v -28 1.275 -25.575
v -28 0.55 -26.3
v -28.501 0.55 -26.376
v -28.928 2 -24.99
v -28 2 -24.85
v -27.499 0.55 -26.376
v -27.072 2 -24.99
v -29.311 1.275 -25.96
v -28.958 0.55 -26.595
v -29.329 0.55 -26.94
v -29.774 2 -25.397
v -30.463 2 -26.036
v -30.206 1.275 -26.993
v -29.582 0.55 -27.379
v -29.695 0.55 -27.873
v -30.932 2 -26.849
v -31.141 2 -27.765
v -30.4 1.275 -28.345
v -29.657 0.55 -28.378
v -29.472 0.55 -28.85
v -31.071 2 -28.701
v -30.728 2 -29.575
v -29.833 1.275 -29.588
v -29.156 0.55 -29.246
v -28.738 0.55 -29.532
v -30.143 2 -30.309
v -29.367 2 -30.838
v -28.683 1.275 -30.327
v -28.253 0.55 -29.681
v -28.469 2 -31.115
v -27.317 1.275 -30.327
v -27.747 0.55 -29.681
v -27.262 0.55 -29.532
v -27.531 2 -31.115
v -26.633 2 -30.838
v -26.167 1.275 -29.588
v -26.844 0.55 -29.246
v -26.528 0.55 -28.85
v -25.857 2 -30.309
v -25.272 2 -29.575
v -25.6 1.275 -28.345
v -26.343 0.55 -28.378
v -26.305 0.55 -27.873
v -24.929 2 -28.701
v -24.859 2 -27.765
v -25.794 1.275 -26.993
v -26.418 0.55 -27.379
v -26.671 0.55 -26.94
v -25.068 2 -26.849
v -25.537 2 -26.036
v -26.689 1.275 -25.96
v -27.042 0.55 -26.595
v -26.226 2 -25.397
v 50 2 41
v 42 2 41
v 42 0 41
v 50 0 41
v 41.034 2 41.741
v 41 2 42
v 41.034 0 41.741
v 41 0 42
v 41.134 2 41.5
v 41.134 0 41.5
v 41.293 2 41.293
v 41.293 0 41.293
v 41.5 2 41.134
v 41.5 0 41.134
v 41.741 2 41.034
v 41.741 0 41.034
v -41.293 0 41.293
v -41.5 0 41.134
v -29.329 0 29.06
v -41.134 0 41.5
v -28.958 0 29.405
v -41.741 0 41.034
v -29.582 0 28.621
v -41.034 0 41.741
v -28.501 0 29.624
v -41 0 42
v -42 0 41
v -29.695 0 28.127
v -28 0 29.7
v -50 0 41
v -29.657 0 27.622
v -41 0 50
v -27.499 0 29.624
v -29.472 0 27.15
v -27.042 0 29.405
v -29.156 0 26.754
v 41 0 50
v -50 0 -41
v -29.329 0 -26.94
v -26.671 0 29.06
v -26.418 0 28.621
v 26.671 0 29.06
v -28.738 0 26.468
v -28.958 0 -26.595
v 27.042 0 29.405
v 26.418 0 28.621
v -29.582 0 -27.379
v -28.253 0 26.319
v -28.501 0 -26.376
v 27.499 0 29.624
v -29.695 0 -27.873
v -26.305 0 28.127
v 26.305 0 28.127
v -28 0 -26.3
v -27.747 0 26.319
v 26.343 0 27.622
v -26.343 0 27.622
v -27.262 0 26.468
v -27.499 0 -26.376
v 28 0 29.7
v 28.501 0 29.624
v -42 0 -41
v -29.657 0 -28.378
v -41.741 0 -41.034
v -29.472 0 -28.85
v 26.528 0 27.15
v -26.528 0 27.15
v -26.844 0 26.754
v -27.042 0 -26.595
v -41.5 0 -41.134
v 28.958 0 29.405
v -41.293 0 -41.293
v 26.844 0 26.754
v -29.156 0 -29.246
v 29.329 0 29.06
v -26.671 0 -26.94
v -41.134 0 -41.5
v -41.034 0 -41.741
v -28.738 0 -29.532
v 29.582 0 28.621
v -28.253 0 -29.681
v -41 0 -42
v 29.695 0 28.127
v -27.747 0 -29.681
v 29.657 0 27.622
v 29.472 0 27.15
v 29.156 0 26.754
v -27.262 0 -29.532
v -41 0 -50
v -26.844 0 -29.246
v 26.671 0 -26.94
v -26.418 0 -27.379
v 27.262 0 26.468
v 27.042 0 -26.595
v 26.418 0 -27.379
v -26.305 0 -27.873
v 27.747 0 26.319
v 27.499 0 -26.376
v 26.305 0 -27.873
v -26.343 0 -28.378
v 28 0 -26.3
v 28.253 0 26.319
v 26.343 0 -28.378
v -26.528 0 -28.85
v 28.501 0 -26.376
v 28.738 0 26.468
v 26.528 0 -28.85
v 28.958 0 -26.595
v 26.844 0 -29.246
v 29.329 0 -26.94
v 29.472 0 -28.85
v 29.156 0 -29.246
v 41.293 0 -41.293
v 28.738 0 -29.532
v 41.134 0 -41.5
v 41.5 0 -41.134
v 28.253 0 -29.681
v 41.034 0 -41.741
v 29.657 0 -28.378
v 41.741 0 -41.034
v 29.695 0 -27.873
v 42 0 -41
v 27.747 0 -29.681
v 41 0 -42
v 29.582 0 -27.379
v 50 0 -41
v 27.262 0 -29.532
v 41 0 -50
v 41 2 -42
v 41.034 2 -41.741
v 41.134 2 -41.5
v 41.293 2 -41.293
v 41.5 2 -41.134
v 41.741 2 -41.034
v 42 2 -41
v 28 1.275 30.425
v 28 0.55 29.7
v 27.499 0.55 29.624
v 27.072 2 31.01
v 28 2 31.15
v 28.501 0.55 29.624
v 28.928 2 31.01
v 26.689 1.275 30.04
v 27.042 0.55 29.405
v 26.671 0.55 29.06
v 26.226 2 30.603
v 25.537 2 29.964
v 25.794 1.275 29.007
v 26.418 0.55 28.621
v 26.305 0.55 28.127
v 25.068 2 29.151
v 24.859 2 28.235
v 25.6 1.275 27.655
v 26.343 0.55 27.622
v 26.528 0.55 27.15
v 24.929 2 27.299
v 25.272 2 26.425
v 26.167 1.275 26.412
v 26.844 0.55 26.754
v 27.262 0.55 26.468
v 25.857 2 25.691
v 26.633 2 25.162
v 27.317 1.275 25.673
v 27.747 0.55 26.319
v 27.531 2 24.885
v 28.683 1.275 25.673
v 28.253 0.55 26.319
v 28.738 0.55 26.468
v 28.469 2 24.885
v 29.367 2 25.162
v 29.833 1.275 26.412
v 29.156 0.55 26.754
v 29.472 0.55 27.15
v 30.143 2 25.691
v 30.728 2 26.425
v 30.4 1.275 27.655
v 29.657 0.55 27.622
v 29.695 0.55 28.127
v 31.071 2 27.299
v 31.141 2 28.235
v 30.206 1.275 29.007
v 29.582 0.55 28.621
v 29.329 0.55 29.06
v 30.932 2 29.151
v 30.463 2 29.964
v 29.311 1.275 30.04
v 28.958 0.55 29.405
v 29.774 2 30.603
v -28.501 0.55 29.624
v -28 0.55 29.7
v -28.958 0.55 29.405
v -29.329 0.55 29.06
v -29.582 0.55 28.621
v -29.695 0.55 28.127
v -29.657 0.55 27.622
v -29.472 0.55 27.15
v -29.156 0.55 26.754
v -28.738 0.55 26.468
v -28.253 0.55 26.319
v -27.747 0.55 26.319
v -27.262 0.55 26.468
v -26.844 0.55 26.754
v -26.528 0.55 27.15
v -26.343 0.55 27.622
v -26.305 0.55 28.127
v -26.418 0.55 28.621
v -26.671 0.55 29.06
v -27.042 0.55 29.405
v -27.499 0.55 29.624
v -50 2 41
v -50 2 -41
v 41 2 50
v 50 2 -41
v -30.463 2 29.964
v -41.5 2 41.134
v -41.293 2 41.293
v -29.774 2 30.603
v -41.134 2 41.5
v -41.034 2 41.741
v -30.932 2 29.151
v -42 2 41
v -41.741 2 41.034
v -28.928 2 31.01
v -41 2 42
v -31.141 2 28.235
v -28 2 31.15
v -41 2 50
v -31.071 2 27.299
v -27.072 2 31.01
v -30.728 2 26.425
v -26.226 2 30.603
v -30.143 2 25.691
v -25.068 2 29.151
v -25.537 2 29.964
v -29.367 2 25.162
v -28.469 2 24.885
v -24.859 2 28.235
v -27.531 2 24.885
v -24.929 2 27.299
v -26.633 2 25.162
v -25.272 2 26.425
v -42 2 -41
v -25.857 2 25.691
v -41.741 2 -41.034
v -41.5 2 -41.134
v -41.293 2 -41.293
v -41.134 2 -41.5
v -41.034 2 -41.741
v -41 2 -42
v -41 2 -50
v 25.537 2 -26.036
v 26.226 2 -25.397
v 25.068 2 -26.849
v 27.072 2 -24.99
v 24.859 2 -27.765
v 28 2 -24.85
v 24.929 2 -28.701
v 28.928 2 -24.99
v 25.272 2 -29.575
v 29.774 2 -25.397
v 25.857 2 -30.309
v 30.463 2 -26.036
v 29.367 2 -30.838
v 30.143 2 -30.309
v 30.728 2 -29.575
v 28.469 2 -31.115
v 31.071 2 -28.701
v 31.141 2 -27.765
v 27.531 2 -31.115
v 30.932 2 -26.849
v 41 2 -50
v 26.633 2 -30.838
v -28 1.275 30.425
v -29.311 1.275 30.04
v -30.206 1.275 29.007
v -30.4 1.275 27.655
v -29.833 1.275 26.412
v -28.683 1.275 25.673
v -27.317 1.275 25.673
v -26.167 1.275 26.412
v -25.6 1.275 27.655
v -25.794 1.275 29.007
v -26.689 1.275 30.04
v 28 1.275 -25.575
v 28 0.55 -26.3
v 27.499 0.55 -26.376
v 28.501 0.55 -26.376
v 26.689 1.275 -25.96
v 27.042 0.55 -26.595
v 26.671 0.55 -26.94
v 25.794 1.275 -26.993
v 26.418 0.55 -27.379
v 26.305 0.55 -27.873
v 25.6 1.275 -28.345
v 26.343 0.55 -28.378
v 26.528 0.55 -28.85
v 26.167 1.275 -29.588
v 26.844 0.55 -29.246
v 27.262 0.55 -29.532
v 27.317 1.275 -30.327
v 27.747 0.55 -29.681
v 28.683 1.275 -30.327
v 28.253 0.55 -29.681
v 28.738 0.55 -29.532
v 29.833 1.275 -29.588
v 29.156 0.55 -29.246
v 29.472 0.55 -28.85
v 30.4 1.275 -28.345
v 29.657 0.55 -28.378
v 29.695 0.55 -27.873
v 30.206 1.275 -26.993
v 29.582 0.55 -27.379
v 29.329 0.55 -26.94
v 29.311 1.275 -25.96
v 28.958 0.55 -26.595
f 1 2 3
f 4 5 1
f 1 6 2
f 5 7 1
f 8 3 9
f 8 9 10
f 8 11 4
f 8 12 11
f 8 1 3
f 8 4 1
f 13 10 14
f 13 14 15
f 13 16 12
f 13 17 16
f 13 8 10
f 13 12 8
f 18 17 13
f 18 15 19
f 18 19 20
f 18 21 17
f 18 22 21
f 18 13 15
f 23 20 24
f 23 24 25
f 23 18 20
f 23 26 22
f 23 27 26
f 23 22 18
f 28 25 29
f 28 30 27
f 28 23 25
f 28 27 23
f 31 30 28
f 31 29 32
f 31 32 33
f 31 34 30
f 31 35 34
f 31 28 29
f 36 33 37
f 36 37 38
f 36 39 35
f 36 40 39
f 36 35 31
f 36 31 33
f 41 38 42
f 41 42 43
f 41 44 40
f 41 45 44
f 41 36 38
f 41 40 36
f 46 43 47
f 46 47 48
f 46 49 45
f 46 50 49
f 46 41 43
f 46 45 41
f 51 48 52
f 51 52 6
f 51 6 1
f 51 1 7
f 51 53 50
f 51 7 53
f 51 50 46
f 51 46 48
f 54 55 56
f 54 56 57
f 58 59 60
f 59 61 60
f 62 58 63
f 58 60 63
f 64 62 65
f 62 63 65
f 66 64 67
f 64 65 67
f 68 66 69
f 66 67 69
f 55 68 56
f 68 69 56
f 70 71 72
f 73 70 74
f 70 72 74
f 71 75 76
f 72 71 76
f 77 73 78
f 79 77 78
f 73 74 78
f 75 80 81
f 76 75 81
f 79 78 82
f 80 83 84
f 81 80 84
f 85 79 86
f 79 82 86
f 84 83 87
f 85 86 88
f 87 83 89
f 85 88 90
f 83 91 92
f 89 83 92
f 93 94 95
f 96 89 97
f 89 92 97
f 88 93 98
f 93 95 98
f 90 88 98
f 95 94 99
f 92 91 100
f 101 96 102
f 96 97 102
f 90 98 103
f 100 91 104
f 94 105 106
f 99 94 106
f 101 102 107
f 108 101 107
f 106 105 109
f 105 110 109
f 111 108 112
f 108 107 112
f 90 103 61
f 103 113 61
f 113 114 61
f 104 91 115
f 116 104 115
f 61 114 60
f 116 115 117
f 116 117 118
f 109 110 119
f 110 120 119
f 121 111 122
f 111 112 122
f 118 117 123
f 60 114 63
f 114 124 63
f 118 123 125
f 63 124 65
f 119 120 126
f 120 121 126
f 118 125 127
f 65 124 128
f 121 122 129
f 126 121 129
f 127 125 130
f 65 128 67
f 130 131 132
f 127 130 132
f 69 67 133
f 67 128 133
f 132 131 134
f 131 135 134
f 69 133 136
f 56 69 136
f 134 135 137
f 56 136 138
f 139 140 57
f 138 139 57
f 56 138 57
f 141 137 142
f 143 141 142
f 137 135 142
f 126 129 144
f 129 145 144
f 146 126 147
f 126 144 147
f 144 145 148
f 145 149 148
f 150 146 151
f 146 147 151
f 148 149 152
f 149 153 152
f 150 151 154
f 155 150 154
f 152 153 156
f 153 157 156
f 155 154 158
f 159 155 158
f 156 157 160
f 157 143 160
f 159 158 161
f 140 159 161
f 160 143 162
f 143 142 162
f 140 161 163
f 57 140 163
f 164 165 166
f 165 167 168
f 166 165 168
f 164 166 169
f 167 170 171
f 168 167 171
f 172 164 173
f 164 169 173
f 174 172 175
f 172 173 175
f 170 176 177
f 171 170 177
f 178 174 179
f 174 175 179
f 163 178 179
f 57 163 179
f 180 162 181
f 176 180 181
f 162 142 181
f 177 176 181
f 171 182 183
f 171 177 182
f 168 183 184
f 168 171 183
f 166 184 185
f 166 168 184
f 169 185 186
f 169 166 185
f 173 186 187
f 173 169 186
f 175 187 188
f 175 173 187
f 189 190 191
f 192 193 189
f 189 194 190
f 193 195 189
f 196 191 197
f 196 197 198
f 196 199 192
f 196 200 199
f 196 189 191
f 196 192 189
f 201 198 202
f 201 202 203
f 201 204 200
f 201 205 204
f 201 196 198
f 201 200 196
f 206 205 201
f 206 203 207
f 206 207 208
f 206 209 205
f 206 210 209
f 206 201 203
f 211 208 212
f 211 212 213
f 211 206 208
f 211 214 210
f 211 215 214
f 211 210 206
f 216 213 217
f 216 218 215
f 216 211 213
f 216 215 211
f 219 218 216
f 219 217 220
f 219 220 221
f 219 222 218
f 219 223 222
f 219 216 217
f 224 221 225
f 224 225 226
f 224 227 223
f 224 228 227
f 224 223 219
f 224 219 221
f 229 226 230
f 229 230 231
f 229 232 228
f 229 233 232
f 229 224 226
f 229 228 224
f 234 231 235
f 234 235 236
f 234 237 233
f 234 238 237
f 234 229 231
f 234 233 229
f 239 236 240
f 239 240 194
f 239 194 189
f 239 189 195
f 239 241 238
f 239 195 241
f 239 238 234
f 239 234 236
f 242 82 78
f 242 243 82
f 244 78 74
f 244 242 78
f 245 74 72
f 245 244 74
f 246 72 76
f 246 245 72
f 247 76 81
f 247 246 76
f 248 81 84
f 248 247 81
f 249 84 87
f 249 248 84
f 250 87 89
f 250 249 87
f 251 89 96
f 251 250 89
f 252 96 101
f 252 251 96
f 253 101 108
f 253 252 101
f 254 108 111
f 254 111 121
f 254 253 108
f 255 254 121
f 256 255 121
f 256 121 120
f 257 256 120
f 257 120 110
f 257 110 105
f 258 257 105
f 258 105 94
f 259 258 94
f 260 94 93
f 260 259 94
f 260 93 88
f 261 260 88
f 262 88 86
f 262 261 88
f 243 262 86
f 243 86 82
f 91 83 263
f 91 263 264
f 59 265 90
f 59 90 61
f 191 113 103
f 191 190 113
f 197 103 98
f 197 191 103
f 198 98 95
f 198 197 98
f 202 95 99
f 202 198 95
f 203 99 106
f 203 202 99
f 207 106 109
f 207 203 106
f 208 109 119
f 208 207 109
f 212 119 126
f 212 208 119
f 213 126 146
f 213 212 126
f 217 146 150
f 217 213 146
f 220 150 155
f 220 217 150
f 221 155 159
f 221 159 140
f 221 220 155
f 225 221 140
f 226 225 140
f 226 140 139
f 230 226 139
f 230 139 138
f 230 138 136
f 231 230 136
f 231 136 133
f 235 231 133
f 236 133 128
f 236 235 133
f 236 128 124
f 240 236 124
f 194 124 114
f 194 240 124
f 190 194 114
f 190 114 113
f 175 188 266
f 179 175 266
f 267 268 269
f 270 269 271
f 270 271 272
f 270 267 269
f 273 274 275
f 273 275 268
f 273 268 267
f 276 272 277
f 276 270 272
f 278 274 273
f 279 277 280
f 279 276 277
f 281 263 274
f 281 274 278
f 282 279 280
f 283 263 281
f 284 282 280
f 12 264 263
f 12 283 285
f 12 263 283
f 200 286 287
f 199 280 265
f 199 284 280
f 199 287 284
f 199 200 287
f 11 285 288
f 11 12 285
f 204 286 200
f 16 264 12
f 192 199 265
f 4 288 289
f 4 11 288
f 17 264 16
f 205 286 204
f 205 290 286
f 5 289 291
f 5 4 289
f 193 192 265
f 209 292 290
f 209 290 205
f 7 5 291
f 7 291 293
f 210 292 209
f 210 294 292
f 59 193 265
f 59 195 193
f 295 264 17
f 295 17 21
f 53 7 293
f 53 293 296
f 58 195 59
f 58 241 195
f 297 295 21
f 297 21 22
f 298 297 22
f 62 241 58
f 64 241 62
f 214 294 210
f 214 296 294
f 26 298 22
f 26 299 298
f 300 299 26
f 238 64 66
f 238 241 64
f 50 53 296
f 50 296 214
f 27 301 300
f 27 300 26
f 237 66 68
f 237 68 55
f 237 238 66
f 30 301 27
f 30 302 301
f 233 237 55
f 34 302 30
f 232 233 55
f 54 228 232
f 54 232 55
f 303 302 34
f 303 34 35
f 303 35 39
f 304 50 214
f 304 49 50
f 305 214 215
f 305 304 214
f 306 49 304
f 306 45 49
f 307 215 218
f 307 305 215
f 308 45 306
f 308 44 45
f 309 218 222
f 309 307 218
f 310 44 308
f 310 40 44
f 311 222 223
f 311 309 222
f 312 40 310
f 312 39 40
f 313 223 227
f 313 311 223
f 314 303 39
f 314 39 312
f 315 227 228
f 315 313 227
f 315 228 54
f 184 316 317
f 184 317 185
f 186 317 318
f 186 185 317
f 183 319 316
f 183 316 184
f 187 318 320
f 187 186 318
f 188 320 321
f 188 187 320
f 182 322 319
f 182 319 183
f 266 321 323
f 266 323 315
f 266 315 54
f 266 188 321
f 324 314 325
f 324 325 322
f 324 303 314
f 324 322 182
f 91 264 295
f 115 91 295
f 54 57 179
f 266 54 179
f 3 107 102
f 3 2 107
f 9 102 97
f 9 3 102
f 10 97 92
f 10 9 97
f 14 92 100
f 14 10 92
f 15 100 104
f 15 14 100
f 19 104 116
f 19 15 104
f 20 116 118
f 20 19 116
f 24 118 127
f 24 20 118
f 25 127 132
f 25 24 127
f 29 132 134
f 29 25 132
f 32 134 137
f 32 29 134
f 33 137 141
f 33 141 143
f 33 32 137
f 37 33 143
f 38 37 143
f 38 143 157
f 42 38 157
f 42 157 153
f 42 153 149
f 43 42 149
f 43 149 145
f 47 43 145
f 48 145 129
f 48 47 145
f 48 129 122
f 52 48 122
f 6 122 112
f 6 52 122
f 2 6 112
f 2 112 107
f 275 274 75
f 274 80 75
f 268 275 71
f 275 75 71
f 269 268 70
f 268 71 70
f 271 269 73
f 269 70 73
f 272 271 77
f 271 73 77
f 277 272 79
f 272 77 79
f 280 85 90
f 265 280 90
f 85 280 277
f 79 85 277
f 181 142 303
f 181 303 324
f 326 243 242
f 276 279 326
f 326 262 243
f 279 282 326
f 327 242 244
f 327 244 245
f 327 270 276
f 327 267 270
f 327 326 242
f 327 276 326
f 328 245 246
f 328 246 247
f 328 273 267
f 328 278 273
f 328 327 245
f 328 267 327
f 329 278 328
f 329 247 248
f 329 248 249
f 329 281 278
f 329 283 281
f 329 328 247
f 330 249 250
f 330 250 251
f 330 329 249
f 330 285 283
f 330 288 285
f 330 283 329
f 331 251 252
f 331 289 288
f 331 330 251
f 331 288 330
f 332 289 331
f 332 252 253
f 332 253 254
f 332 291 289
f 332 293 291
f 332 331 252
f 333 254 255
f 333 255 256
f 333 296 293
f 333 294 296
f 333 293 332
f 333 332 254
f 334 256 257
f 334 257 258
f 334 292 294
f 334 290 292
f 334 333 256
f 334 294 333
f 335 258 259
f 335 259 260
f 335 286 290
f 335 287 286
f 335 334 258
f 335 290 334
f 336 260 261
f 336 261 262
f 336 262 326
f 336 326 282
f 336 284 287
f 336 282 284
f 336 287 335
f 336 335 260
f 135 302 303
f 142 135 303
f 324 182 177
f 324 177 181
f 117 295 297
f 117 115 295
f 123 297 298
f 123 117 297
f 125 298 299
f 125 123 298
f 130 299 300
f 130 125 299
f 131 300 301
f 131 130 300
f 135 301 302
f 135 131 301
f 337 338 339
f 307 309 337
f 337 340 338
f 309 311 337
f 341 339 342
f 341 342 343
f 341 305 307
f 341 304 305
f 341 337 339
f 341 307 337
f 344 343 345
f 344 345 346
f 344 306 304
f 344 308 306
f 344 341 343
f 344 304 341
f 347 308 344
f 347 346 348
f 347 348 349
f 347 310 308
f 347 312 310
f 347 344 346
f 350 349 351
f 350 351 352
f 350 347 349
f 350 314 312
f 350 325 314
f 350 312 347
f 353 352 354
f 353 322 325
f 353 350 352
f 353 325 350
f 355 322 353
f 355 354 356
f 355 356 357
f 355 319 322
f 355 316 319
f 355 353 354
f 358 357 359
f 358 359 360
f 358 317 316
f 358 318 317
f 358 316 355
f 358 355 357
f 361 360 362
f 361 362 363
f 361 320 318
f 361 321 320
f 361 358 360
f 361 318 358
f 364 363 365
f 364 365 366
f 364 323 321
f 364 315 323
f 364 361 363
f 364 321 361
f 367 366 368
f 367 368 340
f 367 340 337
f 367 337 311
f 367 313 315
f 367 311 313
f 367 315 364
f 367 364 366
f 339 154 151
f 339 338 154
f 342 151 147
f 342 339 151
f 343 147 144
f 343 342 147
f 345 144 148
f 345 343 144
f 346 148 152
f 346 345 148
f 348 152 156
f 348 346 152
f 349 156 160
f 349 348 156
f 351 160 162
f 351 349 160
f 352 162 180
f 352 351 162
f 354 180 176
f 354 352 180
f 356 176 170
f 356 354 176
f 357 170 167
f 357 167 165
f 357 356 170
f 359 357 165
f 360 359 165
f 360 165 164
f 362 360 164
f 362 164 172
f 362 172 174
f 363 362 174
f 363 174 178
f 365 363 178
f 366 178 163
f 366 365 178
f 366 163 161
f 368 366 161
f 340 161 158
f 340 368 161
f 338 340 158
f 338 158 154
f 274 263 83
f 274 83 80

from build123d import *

# Parameters (mm, degrees)
SKETCH1_W                                      = 100
SKETCH1_H                                      = 100
BASE_EXTRUSION_DEPTH                           = 2
SKETCH2_W                                      = 9
SKETCH2_H                                      = 9
CORNER_CUTOUTS_DEPTH                           = 71.738956735
CSK_FOR_M3_FLAT_HEAD_MACHINE_SCREW2_AT_2_COUNT = 2
CSK_FOR_M3_FLAT_HEAD_MACHINE_SCREW2_AT_2_PITCH = 56
CSK_FOR_M3_FLAT_HEAD_MACHINE_SCREW2_AT_3_COUNT = 2
CSK_FOR_M3_FLAT_HEAD_MACHINE_SCREW2_AT_3_PITCH = 79.195959493
CSK_FOR_M3_FLAT_HEAD_MACHINE_SCREW2_AT_4_COUNT = 2
CSK_FOR_M3_FLAT_HEAD_MACHINE_SCREW2_AT_4_PITCH = 56
FILLET_FOR_RAILS_R                             = 1


with BuildPart() as part:
    # Sketch1 → Base Extrusion (new body)
    with BuildSketch(Plane(origin=(0, 0, 0), x_dir=(1, 0, 0), z_dir=(0, 1, 0))):
        Rectangle(SKETCH1_W, SKETCH1_H)
    extrude(amount=BASE_EXTRUSION_DEPTH)

    # Sketch2 → Corner Cutouts (cut, through all)
    with BuildSketch(Plane(origin=(0, 2, 0), x_dir=(1, 0, 0), z_dir=(0, 1, 0))):
        with Locations((45.5, 45.5)):
            Rectangle(SKETCH2_W, SKETCH2_H)
        with Locations((-45.5, 45.5)):
            Rectangle(SKETCH2_W, SKETCH2_H)
        with Locations((-45.5, -45.5)):
            Rectangle(SKETCH2_W, SKETCH2_H)
        with Locations((45.5, -45.5)):
            Rectangle(SKETCH2_W, SKETCH2_H)
    extrude(amount=-CORNER_CUTOUTS_DEPTH, mode=Mode.SUBTRACT)

    # Sketch10 → CSK for M3 Flat Head Machine Screw2 (revolve, cut)
    with BuildSketch(Plane(origin=(-28, 2, 28), x_dir=(0, 0, 1), z_dir=(1, 0, 0))):
        Polygon((0, 0), (0, 2), (1.7, 2), (1.7, 1.45), (3.15, 0), align=None)
    csk_for_m3_flat_head_machine_screw2 = revolve(axis=Axis((-28, 8.35, 28), (0, -1, 0)), mode=Mode.SUBTRACT)

    # CSK for M3 Flat Head Machine Screw2 at 2: CSK for M3 Flat Head Machine Screw2 ×2
    with Locations(*[(0, 0, -i * CSK_FOR_M3_FLAT_HEAD_MACHINE_SCREW2_AT_2_PITCH) for i in range(1, CSK_FOR_M3_FLAT_HEAD_MACHINE_SCREW2_AT_2_COUNT)]):
        add(csk_for_m3_flat_head_machine_screw2, mode=Mode.SUBTRACT)

    # CSK for M3 Flat Head Machine Screw2 at 3: CSK for M3 Flat Head Machine Screw2 ×2
    with Locations(*[Vector(0.7071067811865476, 0, -0.7071067811865476) * (i * CSK_FOR_M3_FLAT_HEAD_MACHINE_SCREW2_AT_3_PITCH) for i in range(1, CSK_FOR_M3_FLAT_HEAD_MACHINE_SCREW2_AT_3_COUNT)]):
        add(csk_for_m3_flat_head_machine_screw2, mode=Mode.SUBTRACT)

    # CSK for M3 Flat Head Machine Screw2 at 4: CSK for M3 Flat Head Machine Screw2 ×2
    with Locations(*[(i * CSK_FOR_M3_FLAT_HEAD_MACHINE_SCREW2_AT_4_PITCH, 0, 0) for i in range(1, CSK_FOR_M3_FLAT_HEAD_MACHINE_SCREW2_AT_4_COUNT)]):
        add(csk_for_m3_flat_head_machine_screw2, mode=Mode.SUBTRACT)

    # Fillet For Rails
    fillet_for_rails_edges = [part.edges().sort_by_distance(p)[0] for p in [
        (41, 1, -41),
        (-41, 1, -41),
        (-41, 1, 41),
        (41, 1, 41),
    ]]
    fillet(fillet_for_rails_edges, radius=FILLET_FOR_RAILS_R)


solid = part.part
